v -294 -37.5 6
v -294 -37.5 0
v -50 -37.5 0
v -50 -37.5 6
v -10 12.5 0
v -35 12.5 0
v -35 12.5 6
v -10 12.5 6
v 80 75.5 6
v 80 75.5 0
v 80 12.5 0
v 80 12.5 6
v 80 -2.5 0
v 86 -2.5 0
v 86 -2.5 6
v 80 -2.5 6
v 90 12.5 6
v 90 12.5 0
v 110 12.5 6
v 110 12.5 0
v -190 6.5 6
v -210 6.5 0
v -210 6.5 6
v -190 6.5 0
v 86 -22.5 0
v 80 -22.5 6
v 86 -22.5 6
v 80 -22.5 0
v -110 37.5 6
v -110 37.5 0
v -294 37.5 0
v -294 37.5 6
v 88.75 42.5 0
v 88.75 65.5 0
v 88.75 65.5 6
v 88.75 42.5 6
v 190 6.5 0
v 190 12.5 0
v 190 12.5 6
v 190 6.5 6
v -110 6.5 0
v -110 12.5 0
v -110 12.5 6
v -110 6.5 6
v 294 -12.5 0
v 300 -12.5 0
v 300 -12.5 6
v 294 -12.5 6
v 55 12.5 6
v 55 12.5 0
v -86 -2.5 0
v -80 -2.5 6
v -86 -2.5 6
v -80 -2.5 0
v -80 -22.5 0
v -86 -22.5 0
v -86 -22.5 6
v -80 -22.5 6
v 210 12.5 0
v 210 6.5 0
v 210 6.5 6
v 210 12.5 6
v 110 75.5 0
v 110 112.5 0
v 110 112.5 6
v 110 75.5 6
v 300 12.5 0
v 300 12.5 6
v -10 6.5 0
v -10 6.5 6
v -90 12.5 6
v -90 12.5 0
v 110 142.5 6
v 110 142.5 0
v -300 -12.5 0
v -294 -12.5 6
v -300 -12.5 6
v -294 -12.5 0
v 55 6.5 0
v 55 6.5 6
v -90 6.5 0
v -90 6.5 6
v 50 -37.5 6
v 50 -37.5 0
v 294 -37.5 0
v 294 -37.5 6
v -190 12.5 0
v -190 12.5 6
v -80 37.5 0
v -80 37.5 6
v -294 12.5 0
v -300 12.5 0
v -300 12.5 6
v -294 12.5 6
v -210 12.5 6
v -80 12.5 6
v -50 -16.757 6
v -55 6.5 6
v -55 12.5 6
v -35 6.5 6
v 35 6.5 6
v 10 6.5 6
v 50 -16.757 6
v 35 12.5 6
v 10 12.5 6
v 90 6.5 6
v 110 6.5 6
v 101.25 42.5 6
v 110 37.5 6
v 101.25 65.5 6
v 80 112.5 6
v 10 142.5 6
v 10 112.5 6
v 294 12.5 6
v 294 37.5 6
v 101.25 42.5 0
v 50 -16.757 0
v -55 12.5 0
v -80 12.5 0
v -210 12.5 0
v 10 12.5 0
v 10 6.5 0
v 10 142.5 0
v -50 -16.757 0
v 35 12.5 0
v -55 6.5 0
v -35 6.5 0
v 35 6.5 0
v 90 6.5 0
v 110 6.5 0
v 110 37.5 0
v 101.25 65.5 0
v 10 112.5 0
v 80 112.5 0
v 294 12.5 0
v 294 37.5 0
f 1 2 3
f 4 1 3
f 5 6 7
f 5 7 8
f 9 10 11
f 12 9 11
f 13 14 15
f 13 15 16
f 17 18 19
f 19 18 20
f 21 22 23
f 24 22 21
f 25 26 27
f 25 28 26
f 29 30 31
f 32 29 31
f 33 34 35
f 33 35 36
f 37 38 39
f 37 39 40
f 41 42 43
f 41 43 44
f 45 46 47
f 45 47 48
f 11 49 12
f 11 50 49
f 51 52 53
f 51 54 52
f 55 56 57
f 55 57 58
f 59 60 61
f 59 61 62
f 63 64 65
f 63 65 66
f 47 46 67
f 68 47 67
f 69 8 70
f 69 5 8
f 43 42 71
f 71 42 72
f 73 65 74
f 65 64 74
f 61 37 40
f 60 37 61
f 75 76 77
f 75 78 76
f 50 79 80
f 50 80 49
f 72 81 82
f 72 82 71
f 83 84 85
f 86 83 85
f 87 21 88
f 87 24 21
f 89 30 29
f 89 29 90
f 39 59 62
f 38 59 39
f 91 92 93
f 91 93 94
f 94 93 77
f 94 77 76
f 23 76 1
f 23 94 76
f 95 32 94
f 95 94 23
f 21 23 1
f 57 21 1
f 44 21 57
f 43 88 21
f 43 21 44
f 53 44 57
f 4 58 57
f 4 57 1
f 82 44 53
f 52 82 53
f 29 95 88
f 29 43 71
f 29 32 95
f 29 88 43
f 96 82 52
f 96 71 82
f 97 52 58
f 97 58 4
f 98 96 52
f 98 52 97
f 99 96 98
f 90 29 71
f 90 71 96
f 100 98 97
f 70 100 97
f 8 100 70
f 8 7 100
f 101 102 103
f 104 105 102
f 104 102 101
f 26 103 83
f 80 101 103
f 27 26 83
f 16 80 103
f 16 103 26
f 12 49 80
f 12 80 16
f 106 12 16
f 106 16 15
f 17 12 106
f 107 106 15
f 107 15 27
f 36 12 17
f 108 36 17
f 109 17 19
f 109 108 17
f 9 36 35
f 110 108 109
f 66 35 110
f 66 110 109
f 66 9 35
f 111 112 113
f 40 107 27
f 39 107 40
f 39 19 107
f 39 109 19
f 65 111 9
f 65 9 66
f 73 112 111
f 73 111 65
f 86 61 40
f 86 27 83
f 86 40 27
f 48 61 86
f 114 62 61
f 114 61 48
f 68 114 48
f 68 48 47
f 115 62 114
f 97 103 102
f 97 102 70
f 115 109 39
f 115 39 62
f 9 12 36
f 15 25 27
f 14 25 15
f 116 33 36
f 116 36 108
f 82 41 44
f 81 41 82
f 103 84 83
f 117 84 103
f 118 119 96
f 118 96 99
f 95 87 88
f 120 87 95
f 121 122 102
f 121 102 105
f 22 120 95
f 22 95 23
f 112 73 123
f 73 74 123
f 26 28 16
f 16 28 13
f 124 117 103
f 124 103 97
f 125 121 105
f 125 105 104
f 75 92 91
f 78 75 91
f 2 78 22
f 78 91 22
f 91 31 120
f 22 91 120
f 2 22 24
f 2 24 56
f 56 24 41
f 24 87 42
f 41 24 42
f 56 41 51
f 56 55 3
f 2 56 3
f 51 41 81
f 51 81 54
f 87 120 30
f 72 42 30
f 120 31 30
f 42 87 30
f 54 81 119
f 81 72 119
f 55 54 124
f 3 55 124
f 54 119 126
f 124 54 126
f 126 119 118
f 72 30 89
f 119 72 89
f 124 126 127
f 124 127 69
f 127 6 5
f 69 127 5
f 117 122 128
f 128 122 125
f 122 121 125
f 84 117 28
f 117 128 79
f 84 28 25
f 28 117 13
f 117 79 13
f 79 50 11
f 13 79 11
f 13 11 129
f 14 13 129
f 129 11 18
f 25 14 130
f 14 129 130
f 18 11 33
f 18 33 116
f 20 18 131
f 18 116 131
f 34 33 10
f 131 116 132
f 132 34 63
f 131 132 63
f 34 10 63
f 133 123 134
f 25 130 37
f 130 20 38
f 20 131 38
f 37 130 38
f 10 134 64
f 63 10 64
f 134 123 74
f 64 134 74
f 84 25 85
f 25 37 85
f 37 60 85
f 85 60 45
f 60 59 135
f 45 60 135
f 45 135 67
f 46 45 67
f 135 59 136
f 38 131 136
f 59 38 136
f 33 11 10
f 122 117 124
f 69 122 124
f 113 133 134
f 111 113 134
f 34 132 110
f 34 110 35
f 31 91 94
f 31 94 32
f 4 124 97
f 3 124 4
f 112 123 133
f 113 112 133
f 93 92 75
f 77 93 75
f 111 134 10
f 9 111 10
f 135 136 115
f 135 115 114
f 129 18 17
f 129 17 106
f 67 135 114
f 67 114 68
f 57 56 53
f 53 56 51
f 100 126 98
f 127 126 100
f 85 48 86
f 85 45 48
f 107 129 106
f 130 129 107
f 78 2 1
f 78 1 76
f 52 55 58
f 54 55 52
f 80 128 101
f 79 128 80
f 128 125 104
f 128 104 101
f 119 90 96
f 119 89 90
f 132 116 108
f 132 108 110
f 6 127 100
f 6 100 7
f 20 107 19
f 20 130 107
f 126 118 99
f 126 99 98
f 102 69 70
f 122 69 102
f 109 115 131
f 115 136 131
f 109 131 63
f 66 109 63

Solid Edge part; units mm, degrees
sketch "Sketch1" plane through (0, 0, 0) normal (0, 0, 1) x (1, 0, 0)
  line L0 (-110, 6.5) -> (-90, 6.5)
  line L1 (-90, 6.5) -> (-90, 12.5)
  line L2 (-110, 12.5) -> (-90, 12.5)
  line L3 (-110, 12.5) -> (-110, 6.5)
  line L4 (110, 142.5) -> (10, 142.5)
  line L5 (10, 142.5) -> (10, 112.5)
  line L6 (10, 112.5) -> (80, 112.5)
  line L7 (80, 112.5) -> (80, 75.5)
  line L8 (80, 75.5) -> (80, 12.5)
  line L9 (55, 12.5) -> (80, 12.5)
  line L10 (55, 6.5) -> (55, 12.5)
  line L11 (35, 6.5) -> (55, 6.5)
  line L12 (35, 12.5) -> (35, 6.5)
  line L13 (10, 12.5) -> (35, 12.5)
  line L14 (10, 6.5) -> (10, 12.5)
  line L15 (-10, 6.5) -> (10, 6.5)
  line L16 (-10, 12.5) -> (-10, 6.5)
  line L17 (-35, 12.5) -> (-10, 12.5)
  line L18 (-35, 6.5) -> (-35, 12.5)
  line L19 (-55, 6.5) -> (-35, 6.5)
  line L20 (-55, 12.5) -> (-55, 6.5)
  line L21 (-80, 12.5) -> (-55, 12.5)
  line L22 (-80, 37.5) -> (-80, 12.5)
  line L23 (-110, 37.5) -> (-80, 37.5)
  line L24 (-110, 37.5) -> (-294, 37.5)
  line L25 (-294, 12.5) -> (-294, 37.5)
  line L26 (-300, 12.5) -> (-294, 12.5)
  line L27 (-300, 12.5) -> (-300, -12.5)
  line L28 (-294, -12.5) -> (-300, -12.5)
  line L29 (-294, -37.5) -> (-294, -12.5)
  line L30 (-294, -37.5) -> (-50, -37.5)
  line L31 (-50, -16.7567) -> (-50, -37.5)
  line L32 (50, -16.7567) -> (-50, -16.7567)
  line L33 (50, -37.5) -> (50, -16.7567)
  line L34 (50, -37.5) -> (294, -37.5)
  line L35 (294, -12.5) -> (294, -37.5)
  line L36 (300, -12.5) -> (294, -12.5)
  line L37 (300, -12.5) -> (300, 12.5)
  line L38 (294, 12.5) -> (300, 12.5)
  line L39 (294, 37.5) -> (294, 12.5)
  line L40 (294, 37.5) -> (110, 37.5)
  line L41 (110, 37.5) -> (110, 75.5)
  line L42 (110, 112.5) -> (110, 75.5)
  line L43 (110, 112.5) -> (110, 142.5)
  line L44 (90, 6.5) -> (110, 6.5)
  line L45 (110, 6.5) -> (110, 12.5)
  line L46 (90, 12.5) -> (110, 12.5)
  line L47 (90, 12.5) -> (90, 6.5)
  line L48 (190, 6.5) -> (210, 6.5)
  line L49 (210, 6.5) -> (210, 12.5)
  line L50 (210, 12.5) -> (190, 12.5)
  line L51 (190, 12.5) -> (190, 6.5)
  line L52 (88.75, 42.5) -> (101.25, 42.5)
  line L53 (101.25, 42.5) -> (101.25, 65.5)
  line L54 (101.25, 65.5) -> (88.75, 65.5)
  line L55 (88.75, 65.5) -> (88.75, 42.5)
  line L56 (-80, -22.5) -> (-80, -2.5)
  line L57 (-80, -2.5) -> (-86, -2.5)
  line L58 (-86, -22.5) -> (-86, -2.5)
  line L59 (-86, -22.5) -> (-80, -22.5)
  line L60 (86, -22.5) -> (86, -2.5)
  line L61 (86, -2.5) -> (80, -2.5)
  line L62 (80, -22.5) -> (80, -2.5)
  line L63 (80, -22.5) -> (86, -22.5)
  line L64 (-210, 6.5) -> (-190, 6.5)
  line L65 (-190, 6.5) -> (-190, 12.5)
  line L66 (-190, 12.5) -> (-210, 12.5)
  line L67 (-210, 12.5) -> (-210, 6.5)
  dimension "D1" = 20
  dimension "D2" = 6
  dimension "D3" = 20
  dimension "D4" = 6
  dimension "D5" = 20
  dimension "D6" = 6
  dimension "D7" = 20
  dimension "D8" = 6
  dimension "D9" = 25
  dimension "D10" = 84
  dimension "D11" = 25
  dimension "D12" = 80
  dimension "D13" = 80
  dimension "D14" = 84
  dimension "D15" = 30
  dimension "D16" = 12.5
  dimension "D17" = 23
  dimension "D18" = 30
  dimension "D19" = 20
  dimension "D20" = 6
  dimension "D21" = 15
  dimension "D22" = 20
  dimension "D23" = 6
  dimension "D24" = 15
  dimension "D25" = 6
  dimension "D26" = 6
  dimension "D27" = 100
  dimension "D28" = 244
  dimension "D29" = 6
extrude "Protrusion1" add sketch "Sketch1" along normal blind 6
